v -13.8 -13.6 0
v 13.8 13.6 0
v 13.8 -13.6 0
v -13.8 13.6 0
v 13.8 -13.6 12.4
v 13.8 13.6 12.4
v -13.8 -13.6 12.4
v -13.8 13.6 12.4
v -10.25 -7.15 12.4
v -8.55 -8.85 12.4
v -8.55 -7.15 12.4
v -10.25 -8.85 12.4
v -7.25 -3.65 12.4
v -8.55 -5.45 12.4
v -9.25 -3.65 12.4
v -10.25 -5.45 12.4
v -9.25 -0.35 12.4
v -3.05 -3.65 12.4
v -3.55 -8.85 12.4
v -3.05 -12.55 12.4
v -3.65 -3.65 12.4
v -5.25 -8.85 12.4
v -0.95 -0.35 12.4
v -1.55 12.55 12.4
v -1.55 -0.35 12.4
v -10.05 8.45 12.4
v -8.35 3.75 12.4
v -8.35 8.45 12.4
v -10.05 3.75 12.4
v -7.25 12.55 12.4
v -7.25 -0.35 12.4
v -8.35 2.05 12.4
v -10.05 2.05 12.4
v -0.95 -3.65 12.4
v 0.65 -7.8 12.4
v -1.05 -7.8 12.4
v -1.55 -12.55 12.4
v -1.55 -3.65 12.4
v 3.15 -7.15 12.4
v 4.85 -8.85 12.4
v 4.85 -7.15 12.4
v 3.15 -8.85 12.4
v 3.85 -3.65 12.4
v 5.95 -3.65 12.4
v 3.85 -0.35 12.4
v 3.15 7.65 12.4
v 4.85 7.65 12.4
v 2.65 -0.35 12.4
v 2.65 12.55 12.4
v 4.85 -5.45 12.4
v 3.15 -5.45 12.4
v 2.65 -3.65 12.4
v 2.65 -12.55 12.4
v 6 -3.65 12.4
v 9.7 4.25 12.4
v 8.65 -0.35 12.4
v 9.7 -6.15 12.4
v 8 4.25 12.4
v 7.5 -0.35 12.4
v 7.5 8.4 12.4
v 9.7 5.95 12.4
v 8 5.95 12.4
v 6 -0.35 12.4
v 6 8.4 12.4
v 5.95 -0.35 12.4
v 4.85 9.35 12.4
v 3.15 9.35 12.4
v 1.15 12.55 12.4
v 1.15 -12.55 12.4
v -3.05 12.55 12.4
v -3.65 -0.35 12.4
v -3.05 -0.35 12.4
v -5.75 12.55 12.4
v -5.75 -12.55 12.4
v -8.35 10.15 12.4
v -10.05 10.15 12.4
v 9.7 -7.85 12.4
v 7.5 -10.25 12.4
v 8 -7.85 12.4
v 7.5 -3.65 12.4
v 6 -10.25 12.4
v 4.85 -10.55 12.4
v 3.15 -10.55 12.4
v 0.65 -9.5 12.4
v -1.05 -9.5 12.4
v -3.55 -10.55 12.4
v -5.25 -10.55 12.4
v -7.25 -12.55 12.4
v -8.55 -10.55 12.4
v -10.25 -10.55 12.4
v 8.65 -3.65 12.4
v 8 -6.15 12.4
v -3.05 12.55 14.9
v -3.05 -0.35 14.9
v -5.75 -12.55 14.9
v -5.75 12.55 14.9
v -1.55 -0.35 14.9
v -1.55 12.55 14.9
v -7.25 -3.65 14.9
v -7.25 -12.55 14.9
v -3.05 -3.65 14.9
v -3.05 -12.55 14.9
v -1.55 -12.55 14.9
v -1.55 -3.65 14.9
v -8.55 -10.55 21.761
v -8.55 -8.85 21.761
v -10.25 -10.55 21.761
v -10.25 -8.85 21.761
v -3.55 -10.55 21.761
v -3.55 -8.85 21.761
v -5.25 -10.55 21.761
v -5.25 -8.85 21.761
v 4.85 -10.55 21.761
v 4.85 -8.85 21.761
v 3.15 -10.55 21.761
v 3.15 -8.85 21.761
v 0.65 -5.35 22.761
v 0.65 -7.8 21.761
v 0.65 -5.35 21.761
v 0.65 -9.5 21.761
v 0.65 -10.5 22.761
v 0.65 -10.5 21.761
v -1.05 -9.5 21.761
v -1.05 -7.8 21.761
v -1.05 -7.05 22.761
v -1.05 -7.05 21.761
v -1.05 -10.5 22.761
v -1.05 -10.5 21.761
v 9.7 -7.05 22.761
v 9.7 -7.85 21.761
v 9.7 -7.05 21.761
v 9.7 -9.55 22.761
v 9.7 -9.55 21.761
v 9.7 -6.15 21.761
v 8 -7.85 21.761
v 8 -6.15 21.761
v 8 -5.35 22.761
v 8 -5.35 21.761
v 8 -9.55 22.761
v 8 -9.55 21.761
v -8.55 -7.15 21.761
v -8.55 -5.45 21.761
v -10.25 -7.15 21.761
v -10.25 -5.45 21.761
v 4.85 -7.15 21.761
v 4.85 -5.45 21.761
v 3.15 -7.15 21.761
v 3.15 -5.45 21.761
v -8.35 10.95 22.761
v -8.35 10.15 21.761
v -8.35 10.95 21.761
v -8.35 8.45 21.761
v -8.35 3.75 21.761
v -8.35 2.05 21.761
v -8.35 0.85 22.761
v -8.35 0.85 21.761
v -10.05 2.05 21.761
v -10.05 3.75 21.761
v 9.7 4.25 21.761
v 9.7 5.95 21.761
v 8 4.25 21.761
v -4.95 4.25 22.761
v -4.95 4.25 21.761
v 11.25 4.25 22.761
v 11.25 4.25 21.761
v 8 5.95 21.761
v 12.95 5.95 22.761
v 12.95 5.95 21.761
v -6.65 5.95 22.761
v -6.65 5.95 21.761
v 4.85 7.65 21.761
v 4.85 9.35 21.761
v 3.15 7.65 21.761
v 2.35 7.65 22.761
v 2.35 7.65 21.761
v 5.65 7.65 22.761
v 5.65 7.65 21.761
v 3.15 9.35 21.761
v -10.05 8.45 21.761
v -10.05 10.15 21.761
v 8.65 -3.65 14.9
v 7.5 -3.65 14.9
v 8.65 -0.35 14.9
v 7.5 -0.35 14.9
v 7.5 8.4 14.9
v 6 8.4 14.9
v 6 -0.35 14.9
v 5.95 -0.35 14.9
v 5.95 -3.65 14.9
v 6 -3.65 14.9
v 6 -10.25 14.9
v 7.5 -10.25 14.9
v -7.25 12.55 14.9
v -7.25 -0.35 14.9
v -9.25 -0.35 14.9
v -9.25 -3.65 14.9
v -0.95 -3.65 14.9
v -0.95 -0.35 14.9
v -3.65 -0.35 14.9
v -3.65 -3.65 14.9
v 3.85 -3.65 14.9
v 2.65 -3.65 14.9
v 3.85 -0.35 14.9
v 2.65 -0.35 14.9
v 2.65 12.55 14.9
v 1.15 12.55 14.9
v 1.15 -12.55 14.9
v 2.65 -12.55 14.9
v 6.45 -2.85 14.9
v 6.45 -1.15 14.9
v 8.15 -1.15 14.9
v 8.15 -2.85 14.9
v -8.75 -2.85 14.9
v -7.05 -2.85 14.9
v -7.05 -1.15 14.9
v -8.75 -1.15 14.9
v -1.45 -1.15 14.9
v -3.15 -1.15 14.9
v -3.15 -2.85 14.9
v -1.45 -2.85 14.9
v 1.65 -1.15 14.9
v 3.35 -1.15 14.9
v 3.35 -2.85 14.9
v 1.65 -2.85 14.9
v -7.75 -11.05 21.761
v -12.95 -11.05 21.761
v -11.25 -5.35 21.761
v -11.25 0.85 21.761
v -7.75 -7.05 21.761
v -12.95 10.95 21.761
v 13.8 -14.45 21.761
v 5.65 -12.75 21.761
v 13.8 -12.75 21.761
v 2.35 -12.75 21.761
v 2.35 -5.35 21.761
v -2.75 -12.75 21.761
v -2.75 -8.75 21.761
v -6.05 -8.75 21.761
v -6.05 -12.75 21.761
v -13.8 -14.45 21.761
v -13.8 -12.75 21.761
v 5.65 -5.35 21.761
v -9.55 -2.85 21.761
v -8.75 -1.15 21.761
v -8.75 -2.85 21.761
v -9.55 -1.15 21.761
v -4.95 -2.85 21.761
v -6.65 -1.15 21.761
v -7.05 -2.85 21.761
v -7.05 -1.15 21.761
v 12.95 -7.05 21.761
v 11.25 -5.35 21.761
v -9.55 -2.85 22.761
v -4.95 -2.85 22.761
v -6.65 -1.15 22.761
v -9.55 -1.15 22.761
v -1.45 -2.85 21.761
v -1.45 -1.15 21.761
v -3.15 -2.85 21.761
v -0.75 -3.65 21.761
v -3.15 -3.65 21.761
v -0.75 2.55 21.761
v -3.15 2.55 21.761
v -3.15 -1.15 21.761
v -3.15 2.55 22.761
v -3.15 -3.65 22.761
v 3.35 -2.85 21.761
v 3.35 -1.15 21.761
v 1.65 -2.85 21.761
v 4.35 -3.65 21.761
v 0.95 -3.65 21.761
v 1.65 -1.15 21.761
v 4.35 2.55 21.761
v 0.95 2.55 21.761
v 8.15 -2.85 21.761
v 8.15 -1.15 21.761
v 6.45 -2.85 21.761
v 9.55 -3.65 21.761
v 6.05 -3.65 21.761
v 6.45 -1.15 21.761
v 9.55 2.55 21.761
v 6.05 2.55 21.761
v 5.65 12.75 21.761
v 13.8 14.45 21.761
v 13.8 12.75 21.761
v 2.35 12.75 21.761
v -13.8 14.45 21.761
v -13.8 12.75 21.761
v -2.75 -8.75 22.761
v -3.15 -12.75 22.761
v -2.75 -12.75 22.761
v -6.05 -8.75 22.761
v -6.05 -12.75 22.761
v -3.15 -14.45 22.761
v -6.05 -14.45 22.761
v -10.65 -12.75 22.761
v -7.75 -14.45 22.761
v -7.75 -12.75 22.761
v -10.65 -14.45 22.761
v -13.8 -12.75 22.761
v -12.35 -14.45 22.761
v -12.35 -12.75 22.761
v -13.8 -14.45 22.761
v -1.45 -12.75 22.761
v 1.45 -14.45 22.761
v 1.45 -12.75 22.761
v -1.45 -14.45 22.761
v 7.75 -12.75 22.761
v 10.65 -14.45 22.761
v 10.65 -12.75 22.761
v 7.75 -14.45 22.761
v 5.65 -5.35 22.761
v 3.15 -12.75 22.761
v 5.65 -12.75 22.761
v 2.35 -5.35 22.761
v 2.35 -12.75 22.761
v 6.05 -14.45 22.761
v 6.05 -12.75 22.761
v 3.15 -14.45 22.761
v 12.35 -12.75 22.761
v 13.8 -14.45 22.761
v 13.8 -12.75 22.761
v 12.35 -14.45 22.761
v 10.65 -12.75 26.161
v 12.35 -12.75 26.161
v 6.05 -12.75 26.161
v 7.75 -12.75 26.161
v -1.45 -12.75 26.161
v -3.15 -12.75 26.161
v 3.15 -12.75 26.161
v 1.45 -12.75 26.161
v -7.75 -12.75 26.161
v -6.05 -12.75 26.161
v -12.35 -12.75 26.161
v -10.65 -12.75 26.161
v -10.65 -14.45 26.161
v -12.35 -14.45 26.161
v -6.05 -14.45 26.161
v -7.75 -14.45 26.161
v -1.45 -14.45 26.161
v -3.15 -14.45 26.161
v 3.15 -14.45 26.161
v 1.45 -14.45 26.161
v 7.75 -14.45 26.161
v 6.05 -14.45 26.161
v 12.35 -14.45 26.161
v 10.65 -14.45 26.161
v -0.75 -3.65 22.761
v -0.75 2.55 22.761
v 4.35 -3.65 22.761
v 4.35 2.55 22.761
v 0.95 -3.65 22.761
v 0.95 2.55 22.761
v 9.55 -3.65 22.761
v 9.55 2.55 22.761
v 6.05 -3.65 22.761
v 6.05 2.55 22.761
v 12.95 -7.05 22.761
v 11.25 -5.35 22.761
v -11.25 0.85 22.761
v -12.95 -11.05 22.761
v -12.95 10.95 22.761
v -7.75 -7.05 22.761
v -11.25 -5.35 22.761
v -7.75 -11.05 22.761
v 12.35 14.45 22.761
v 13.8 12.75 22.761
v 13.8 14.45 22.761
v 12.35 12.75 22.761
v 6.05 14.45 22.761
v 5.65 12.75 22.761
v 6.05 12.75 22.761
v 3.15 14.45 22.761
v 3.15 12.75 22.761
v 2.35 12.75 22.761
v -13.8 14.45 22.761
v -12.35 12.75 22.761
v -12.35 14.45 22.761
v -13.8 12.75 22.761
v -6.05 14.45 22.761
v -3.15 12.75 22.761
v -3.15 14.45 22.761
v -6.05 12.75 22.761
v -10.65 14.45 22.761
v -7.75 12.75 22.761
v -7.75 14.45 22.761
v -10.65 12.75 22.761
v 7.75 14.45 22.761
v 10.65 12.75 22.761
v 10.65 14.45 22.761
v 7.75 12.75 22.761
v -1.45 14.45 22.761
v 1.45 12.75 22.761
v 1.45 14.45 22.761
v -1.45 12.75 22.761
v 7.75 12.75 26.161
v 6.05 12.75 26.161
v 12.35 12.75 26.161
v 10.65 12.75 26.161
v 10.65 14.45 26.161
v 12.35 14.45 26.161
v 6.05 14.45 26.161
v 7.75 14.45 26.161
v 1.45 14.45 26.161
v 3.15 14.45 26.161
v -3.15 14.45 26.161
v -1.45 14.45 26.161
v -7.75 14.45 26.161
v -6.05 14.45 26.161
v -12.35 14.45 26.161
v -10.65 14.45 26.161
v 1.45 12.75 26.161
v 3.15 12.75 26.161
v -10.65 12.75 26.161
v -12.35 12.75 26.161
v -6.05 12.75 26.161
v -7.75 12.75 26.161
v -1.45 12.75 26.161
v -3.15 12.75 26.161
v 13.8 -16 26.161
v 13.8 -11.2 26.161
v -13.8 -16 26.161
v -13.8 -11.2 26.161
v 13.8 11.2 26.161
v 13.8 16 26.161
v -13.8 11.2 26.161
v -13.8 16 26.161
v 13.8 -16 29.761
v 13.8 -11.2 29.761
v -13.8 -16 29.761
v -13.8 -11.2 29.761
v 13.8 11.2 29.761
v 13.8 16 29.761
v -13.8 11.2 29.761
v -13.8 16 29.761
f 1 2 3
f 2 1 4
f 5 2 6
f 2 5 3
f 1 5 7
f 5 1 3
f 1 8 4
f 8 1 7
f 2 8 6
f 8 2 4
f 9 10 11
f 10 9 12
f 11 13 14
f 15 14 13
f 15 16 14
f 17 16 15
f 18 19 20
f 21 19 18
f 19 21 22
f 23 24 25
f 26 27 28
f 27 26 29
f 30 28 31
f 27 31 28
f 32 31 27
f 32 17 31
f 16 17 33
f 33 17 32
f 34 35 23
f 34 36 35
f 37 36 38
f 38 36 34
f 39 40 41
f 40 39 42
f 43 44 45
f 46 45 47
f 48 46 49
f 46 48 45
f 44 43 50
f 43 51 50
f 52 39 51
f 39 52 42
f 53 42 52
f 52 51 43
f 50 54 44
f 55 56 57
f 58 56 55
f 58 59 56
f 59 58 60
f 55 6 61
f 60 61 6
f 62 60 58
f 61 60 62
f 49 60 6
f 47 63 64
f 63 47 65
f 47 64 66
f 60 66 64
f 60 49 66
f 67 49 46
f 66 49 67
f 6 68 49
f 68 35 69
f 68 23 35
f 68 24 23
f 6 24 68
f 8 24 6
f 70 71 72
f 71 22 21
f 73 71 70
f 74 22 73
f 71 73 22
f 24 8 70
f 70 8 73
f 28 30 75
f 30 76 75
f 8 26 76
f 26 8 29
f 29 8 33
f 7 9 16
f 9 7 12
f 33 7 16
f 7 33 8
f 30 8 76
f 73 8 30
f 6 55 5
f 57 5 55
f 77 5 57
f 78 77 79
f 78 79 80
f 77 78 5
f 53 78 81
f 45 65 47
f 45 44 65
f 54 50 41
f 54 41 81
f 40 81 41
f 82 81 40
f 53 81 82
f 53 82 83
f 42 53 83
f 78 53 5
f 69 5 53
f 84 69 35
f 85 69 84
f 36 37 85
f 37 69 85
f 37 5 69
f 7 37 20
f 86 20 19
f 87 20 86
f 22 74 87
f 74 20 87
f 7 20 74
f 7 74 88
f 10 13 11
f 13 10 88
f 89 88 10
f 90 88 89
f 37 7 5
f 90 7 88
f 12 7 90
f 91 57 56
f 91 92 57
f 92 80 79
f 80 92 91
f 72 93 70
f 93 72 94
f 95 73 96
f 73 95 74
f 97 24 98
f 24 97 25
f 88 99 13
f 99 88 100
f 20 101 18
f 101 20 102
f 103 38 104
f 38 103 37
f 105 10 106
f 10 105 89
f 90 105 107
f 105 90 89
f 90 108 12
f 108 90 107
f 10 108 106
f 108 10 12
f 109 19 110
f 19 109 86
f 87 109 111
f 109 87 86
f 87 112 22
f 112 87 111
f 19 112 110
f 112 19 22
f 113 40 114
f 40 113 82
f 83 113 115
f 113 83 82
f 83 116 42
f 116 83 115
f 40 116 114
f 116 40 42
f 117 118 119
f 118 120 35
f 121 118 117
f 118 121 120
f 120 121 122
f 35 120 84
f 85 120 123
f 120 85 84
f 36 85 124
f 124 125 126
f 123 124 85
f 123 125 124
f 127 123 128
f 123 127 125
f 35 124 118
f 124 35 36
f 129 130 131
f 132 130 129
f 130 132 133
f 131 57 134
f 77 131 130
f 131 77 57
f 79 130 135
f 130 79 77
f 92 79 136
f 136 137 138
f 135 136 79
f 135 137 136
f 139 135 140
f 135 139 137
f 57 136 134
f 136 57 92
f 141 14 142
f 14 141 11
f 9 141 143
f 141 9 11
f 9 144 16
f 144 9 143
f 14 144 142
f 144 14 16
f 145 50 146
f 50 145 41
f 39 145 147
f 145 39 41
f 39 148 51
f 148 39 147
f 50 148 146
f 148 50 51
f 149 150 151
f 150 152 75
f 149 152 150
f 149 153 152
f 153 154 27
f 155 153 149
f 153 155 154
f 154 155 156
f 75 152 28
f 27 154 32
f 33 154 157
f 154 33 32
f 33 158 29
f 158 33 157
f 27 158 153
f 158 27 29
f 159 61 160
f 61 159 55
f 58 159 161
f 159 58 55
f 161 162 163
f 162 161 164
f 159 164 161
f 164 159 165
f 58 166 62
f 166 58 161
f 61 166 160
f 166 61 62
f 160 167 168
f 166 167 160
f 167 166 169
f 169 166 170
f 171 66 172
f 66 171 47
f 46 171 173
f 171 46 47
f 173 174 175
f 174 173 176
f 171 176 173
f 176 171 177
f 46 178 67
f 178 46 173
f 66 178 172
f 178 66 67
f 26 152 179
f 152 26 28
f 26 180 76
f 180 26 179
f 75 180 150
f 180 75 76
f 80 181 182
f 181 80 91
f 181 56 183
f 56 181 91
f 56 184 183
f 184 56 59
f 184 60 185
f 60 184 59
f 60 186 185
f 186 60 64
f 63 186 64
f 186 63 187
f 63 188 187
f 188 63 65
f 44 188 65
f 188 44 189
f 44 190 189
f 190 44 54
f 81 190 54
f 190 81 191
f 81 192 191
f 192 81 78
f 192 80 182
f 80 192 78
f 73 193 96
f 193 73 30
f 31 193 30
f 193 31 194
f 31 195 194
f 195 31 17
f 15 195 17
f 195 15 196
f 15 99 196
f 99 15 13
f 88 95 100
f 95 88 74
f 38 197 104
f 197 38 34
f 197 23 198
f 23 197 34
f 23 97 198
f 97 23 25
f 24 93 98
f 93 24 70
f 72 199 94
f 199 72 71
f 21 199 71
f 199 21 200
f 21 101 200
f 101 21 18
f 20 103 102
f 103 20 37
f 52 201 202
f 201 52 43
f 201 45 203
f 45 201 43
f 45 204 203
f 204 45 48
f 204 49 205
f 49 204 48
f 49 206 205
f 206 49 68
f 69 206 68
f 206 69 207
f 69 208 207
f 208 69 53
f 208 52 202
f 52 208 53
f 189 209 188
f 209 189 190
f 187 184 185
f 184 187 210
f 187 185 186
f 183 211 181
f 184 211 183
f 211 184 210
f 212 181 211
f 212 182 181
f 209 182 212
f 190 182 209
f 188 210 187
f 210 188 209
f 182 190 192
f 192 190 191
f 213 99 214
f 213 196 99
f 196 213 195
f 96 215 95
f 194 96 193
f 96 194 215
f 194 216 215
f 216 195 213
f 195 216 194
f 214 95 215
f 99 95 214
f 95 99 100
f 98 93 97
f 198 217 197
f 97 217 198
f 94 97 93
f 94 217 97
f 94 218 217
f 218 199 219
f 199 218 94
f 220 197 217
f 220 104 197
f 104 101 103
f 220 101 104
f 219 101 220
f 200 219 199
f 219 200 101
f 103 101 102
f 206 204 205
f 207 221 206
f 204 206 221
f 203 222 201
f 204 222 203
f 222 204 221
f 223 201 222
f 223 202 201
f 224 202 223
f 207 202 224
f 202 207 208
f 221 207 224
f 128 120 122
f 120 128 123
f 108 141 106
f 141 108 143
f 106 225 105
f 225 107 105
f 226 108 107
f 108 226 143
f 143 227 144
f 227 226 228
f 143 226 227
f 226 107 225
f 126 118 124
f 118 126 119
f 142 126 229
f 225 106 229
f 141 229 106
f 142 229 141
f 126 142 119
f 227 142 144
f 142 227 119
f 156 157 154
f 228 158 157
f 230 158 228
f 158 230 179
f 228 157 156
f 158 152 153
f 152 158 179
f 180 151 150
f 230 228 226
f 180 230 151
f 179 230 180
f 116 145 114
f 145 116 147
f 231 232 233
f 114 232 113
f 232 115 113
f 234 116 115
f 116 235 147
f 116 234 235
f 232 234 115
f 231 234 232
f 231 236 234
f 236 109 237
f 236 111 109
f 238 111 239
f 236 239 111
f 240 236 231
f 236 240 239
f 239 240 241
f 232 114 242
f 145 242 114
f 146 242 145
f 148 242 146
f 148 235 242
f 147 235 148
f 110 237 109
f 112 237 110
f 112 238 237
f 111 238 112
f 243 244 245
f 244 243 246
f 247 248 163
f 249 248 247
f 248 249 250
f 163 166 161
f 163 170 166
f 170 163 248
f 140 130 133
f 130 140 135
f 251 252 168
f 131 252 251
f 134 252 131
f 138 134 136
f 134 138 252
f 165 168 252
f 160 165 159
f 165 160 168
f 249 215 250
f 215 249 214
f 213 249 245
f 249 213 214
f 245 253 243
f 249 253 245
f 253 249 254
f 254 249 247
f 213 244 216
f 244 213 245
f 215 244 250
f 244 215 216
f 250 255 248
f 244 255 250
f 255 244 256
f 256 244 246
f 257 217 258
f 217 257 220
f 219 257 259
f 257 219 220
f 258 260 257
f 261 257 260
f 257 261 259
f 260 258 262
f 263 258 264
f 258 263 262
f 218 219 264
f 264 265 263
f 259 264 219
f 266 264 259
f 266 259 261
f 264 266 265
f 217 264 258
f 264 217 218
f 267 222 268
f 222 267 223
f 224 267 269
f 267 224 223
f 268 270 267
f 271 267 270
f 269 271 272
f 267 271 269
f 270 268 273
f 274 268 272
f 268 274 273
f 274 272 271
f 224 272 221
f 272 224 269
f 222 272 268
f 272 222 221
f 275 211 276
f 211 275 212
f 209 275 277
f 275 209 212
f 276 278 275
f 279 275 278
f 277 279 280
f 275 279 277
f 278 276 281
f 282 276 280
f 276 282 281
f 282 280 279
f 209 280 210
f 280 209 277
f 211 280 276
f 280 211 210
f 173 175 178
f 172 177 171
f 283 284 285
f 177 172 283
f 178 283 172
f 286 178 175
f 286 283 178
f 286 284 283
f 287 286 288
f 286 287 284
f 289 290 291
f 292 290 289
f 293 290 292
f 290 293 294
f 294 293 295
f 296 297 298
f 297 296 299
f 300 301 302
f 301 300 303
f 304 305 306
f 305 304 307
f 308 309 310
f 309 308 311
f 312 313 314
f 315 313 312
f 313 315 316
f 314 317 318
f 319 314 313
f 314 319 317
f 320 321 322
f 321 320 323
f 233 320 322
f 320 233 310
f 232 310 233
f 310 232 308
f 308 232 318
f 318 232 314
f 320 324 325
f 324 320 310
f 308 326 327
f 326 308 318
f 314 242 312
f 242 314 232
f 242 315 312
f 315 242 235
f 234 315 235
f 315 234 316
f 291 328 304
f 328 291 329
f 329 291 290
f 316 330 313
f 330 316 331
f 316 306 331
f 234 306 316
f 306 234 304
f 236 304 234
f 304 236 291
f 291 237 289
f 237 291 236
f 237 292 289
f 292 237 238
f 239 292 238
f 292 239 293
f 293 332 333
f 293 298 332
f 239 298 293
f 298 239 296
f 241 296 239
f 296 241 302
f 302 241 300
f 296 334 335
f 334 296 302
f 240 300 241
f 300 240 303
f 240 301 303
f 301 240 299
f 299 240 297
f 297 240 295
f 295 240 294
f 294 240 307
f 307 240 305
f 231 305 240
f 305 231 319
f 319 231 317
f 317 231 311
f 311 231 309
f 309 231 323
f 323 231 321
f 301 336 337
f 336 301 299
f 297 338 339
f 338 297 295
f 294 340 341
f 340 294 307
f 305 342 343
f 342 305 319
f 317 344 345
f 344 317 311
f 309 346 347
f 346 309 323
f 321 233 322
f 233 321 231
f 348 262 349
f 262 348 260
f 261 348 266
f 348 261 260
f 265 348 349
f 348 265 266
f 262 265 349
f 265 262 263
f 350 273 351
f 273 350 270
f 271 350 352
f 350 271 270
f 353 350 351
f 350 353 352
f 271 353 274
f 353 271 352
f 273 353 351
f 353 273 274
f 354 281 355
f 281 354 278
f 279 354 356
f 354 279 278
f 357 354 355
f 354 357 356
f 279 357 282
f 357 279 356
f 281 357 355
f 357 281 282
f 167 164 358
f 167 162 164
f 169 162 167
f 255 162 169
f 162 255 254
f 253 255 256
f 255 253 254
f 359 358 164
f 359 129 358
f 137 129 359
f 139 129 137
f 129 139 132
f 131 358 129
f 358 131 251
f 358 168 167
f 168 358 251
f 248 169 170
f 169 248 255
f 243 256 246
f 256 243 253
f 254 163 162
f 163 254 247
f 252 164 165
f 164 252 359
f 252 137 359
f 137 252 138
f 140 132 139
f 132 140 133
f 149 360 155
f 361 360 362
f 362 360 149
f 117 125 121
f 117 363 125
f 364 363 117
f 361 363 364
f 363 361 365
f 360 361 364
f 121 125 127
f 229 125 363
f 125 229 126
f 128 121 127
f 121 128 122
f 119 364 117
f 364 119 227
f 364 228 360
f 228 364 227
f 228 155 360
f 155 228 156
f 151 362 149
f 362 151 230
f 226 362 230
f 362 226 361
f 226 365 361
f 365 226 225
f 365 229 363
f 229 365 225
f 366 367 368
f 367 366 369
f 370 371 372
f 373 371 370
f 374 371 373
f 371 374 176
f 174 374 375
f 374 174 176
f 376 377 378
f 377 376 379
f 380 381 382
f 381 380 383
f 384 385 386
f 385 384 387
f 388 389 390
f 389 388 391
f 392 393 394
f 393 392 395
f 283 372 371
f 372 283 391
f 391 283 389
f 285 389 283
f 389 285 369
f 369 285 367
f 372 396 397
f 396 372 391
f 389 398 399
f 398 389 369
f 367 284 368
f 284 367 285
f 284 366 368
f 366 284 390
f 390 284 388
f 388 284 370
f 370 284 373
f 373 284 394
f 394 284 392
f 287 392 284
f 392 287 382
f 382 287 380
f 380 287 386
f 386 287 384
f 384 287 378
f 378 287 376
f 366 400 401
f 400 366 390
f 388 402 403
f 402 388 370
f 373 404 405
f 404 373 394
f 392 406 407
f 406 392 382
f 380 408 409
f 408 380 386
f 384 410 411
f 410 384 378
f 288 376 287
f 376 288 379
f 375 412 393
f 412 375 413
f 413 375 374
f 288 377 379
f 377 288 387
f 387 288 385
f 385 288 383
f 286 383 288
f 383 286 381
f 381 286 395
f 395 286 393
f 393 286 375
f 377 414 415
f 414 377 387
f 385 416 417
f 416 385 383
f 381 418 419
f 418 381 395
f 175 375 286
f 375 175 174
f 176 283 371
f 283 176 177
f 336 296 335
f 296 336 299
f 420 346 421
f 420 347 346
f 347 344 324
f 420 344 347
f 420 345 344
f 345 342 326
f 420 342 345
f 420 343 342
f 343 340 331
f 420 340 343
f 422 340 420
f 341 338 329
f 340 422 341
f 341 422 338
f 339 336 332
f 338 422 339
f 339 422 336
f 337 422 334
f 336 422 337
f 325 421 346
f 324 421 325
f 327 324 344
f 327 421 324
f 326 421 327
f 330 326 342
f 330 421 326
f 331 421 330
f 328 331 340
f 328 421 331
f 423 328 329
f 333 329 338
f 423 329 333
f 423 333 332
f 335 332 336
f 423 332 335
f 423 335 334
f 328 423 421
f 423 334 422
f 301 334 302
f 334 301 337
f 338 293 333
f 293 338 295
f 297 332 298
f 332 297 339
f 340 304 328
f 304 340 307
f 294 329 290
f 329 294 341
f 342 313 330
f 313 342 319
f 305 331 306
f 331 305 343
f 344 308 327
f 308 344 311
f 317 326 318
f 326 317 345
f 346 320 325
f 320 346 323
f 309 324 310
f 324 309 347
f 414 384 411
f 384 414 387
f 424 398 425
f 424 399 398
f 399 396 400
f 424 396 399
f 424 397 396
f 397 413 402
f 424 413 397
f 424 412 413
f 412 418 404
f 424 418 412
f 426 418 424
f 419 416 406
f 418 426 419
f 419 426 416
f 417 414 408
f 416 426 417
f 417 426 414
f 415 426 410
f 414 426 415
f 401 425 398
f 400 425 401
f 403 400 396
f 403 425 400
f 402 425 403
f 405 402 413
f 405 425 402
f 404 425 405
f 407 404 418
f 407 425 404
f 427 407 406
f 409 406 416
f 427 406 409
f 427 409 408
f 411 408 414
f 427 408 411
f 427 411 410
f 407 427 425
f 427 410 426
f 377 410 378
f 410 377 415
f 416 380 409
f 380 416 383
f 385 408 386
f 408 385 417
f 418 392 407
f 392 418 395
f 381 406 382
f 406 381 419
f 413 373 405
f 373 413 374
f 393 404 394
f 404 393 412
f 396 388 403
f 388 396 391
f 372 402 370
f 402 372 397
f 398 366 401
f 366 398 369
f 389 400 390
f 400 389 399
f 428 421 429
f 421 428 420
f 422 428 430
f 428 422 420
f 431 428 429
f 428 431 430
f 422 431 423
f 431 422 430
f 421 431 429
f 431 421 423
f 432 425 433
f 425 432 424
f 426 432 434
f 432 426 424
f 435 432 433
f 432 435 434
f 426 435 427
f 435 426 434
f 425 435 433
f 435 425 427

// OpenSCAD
// Generated by SolidPython 0.4.2 on 2020-09-29 23:21:32
//!OpenSCAD

scale(v = 0.0100000000) {
	translate(v = [-1380, -1360, 0]) {
		union() {
			color(c = [0.4000000000, 0.4000000000, 0.4000000000]) {
				translate(v = [0, 0, 0]) {
					linear_extrude(height = 1000.0000000000) {
						polygon(paths = [[0, 1, 2, 3]], points = [[0, 0], [0, 2720], [2760, 2720], [2760, 0]]);
					}
				}
			}
			color(c = [0.2000000000, 0.6000000000, 0.2000000000]) {
				translate(v = [0, 0, 1000.0000000000]) {
					linear_extrude(height = 120.0000000000) {
						polygon(paths = [[0, 1, 2, 3]], points = [[0, 1305], [0, 2720], [2760, 2720], [2760, 1305]]);
					}
				}
			}
			color(c = [0.4000000000, 0.4000000000, 0.4000000000]) {
				translate(v = [0, 0, 1000.0000000000]) {
					linear_extrude(height = 120.0000000000) {
						polygon(paths = [[0, 1, 2, 3]], points = [[0, 0], [0, 1305], [2760, 1305], [2760, 0]]);
					}
				}
			}
			color(c = [0.9000000000, 0.6000000000, 0.6000000000]) {
				translate(v = [0, 0, 1120.0000000000]) {
					linear_extrude(height = 120.0000000000) {
						polygon(paths = [[0, 1, 2, 3]], points = [[2130, 1650], [2130, 2070], [2390, 2070], [2390, 1650]]);
					}
				}
			}
			color(c = [0.9000000000, 0.6000000000, 0.6000000000]) {
				translate(v = [0, 0, 1120.0000000000]) {
					linear_extrude(height = 120.0000000000) {
						polygon(paths = [[0, 1, 2, 3]], points = [[335, 1485], [335, 2485], [655, 2485], [655, 1485]]);
					}
				}
			}
			color(c = [0.9000000000, 0.6000000000, 0.6000000000]) {
				translate(v = [0, 0, 1120.0000000000]) {
					linear_extrude(height = 120.0000000000) {
						polygon(paths = [[0, 1, 2, 3]], points = [[805, 1485], [805, 2485], [1075, 2485], [1075, 1485]]);
					}
				}
			}
			color(c = [0.9000000000, 0.6000000000, 0.6000000000]) {
				translate(v = [0, 0, 1120.0000000000]) {
					linear_extrude(height = 120.0000000000) {
						polygon(paths = [[0, 1, 2, 3]], points = [[1225, 1485], [1225, 2485], [1495, 2485], [1495, 1485]]);
					}
				}
			}
			color(c = [0.9000000000, 0.6000000000, 0.6000000000]) {
				translate(v = [0, 0, 1120.0000000000]) {
					linear_extrude(height = 120.0000000000) {
						polygon(paths = [[0, 1, 2, 3, 4, 5, 6, 7]], points = [[1645, 1485], [1645, 2485], [1905, 2485], [1905, 2070], [1980, 2070], [1980, 1650], [1905, 1650], [1905, 1485]]);
					}
				}
			}
			color(c = [0.9000000000, 0.6000000000, 0.9000000000]) {
				translate(v = [0, 0, 1120.0000000000]) {
					linear_extrude(height = 120.0000000000) {
						polygon(paths = [[0, 1, 2, 3]], points = [[315, 235], [315, 885], [655, 885], [655, 235]]);
					}
				}
			}
			color(c = [0.9000000000, 0.6000000000, 0.9000000000]) {
				translate(v = [0, 0, 1120.0000000000]) {
					linear_extrude(height = 120.0000000000) {
						polygon(paths = [[0, 1, 2, 3]], points = [[805, 235], [805, 885], [1075, 885], [1075, 235]]);
					}
				}
			}
			color(c = [0.9000000000, 0.6000000000, 0.9000000000]) {
				translate(v = [0, 0, 1120.0000000000]) {
					linear_extrude(height = 120.0000000000) {
						polygon(paths = [[0, 1, 2, 3]], points = [[1225, 235], [1225, 885], [1495, 885], [1495, 235]]);
					}
				}
			}
			color(c = [0.9000000000, 0.6000000000, 0.9000000000]) {
				translate(v = [0, 0, 1120.0000000000]) {
					linear_extrude(height = 120.0000000000) {
						polygon(paths = [[0, 1, 2, 3, 4, 5]], points = [[1645, 235], [1645, 885], [1980, 885], [1980, 465], [1905, 465], [1905, 235]]);
					}
				}
			}
			color(c = [0.9000000000, 0.6000000000, 0.9000000000]) {
				translate(v = [0, 0, 1120.0000000000]) {
					linear_extrude(height = 120.0000000000) {
						polygon(paths = [[0, 1, 2, 3]], points = [[2130, 465], [2130, 885], [2390, 885], [2390, 465]]);
					}
				}
			}
			color(c = [0.2000000000, 0.6000000000, 0.2000000000]) {
				translate(v = [0, 0, 1120.0000000000]) {
					linear_extrude(height = 120.0000000000) {
						difference() {
							polygon(paths = [[0, 1, 2, 3]], points = [[0, 1305], [0, 2720], [2760, 2720], [2760, 1305]]);
							polygon(paths = [[0, 1, 2, 3]], points = [[335, 1485], [655, 1485], [655, 2485], [335, 2485]]);
							polygon(paths = [[0, 1, 2, 3]], points = [[805, 1485], [1075, 1485], [1075, 2485], [805, 2485]]);
							polygon(paths = [[0, 1, 2, 3]], points = [[1225, 1485], [1495, 1485], [1495, 2485], [1225, 2485]]);
							polygon(paths = [[0, 1, 2, 3]], points = [[2130, 1650], [2390, 1650], [2390, 2070], [2130, 2070]]);
							polygon(paths = [[0, 1, 2, 3, 4, 5, 6, 7]], points = [[1645, 1485], [1905, 1485], [1905, 1650], [1980, 1650], [1980, 2070], [1905, 2070], [1905, 2485], [1645, 2485]]);
						}
					}
				}
			}
			color(c = [0.4000000000, 0.4000000000, 0.4000000000]) {
				translate(v = [0, 0, 1120.0000000000]) {
					linear_extrude(height = 120.0000000000) {
						difference() {
							polygon(paths = [[0, 1, 2, 3]], points = [[0, 0], [0, 1305], [2760, 1305], [2760, 0]]);
							polygon(paths = [[0, 1, 2, 3]], points = [[315, 235], [655, 235], [655, 885], [315, 885]]);
							polygon(paths = [[0, 1, 2, 3]], points = [[805, 235], [1075, 235], [1075, 885], [805, 885]]);
							polygon(paths = [[0, 1, 2, 3]], points = [[1225, 235], [1495, 235], [1495, 885], [1225, 885]]);
							polygon(paths = [[0, 1, 2, 3]], points = [[2130, 465], [2390, 465], [2390, 885], [2130, 885]]);
							polygon(paths = [[0, 1, 2, 3, 4, 5]], points = [[1645, 235], [1905, 235], [1905, 465], [1980, 465], [1980, 885], [1645, 885]]);
						}
					}
				}
			}
			color(c = [0.1000000000, 0.1000000000, 0.1000000000]) {
				translate(v = [0, 0, 1240.0000000000]) {
					linear_extrude(height = 70.0000000000) {
						polygon(paths = [[0, 1, 2, 3]], points = [[355, 305], [355, 475], [525, 475], [525, 305]]);
					}
				}
			}
			color(c = [0.1000000000, 0.1000000000, 0.1000000000]) {
				translate(v = [0, 0, 1240.0000000000]) {
					linear_extrude(height = 70.0000000000) {
						polygon(paths = [[0, 1, 2, 3]], points = [[855, 305], [855, 475], [1025, 475], [1025, 305]]);
					}
				}
			}
			color(c = [0.1000000000, 0.1000000000, 0.1000000000]) {
				translate(v = [0, 0, 1240.0000000000]) {
					linear_extrude(height = 70.0000000000) {
						polygon(paths = [[0, 1, 2, 3]], points = [[1695, 305], [1695, 475], [1865, 475], [1865, 305]]);
					}
				}
			}
			color(c = [0.1000000000, 0.1000000000, 0.1000000000]) {
				translate(v = [0, 0, 1240.0000000000]) {
					linear_extrude(height = 70.0000000000) {
						polygon(paths = [[0, 1, 2, 3]], points = [[1275, 410], [1275, 580], [1445, 580], [1445, 410]]);
					}
				}
			}
			color(c = [0.1000000000, 0.1000000000, 0.1000000000]) {
				translate(v = [0, 0, 1240.0000000000]) {
					linear_extrude(height = 70.0000000000) {
						polygon(paths = [[0, 1, 2, 3]], points = [[2180, 575], [2180, 745], [2350, 745], [2350, 575]]);
					}
				}
			}
			color(c = [0.1000000000, 0.1000000000, 0.1000000000]) {
				translate(v = [0, 0, 1240.0000000000]) {
					linear_extrude(height = 70.0000000000) {
						polygon(paths = [[0, 1, 2, 3]], points = [[355, 645], [355, 815], [525, 815], [525, 645]]);
					}
				}
			}
			color(c = [0.1000000000, 0.1000000000, 0.1000000000]) {
				translate(v = [0, 0, 1240.0000000000]) {
					linear_extrude(height = 70.0000000000) {
						polygon(paths = [[0, 1, 2, 3]], points = [[1695, 645], [1695, 815], [1865, 815], [1865, 645]]);
					}
				}
			}
			color(c = [0.1000000000, 0.1000000000, 0.1000000000]) {
				translate(v = [0, 0, 1240.0000000000]) {
					linear_extrude(height = 70.0000000000) {
						polygon(paths = [[0, 1, 2, 3]], points = [[375, 1565], [375, 1735], [545, 1735], [545, 1565]]);
					}
				}
			}
			color(c = [0.1000000000, 0.1000000000, 0.1000000000]) {
				translate(v = [0, 0, 1240.0000000000]) {
					linear_extrude(height = 70.0000000000) {
						polygon(paths = [[0, 1, 2, 3]], points = [[2180, 1785], [2180, 1955], [2350, 1955], [2350, 1785]]);
					}
				}
			}
			color(c = [0.1000000000, 0.1000000000, 0.1000000000]) {
				translate(v = [0, 0, 1240.0000000000]) {
					linear_extrude(height = 70.0000000000) {
						polygon(paths = [[0, 1, 2, 3]], points = [[1695, 2125], [1695, 2295], [1865, 2295], [1865, 2125]]);
					}
				}
			}
			color(c = [0.1000000000, 0.1000000000, 0.1000000000]) {
				translate(v = [0, 0, 1240.0000000000]) {
					linear_extrude(height = 70.0000000000) {
						polygon(paths = [[0, 1, 2, 3]], points = [[375, 2205], [375, 2375], [545, 2375], [545, 2205]]);
					}
				}
			}
			color(c = [1.0000000000, 1.0000000000, 1.0000000000]) {
				translate(v = [0, 0, 1240.0000000000]) {
					linear_extrude(height = 70.0000000000) {
						polygon(paths = [[0, 1, 2, 3, 4, 5, 6, 7, 8, 9, 10, 11]], points = [[1980, 335], [1980, 995], [1975, 995], [1975, 1325], [1980, 1325], [1980, 2200], [2130, 2200], [2130, 1325], [2245, 1325], [2245, 995], [2130, 995], [2130, 335]]);
					}
				}
			}
			color(c = [1.0000000000, 1.0000000000, 1.0000000000]) {
				translate(v = [0, 0, 1240.0000000000]) {
					linear_extrude(height = 70.0000000000) {
						polygon(paths = [[0, 1, 2, 3, 4, 5, 6, 7]], points = [[655, 105], [655, 995], [455, 995], [455, 1325], [655, 1325], [655, 2615], [805, 2615], [805, 105]]);
					}
				}
			}
			color(c = [1.0000000000, 1.0000000000, 1.0000000000]) {
				translate(v = [0, 0, 1240.0000000000]) {
					linear_extrude(height = 70.0000000000) {
						polygon(paths = [[0, 1, 2, 3, 4, 5, 6, 7, 8, 9, 10, 11]], points = [[1075, 105], [1075, 995], [1015, 995], [1015, 1325], [1075, 1325], [1075, 2615], [1225, 2615], [1225, 1325], [1285, 1325], [1285, 995], [1225, 995], [1225, 105]]);
					}
				}
			}
			color(c = [1.0000000000, 1.0000000000, 1.0000000000]) {
				translate(v = [0, 0, 1240.0000000000]) {
					linear_extrude(height = 70.0000000000) {
						polygon(paths = [[0, 1, 2, 3, 4, 5, 6, 7]], points = [[1495, 105], [1495, 2615], [1645, 2615], [1645, 1325], [1765, 1325], [1765, 995], [1645, 995], [1645, 105]]);
					}
				}
			}
			color(c = [0.1000000000, 0.1000000000, 0.1000000000]) {
				translate(v = [0, 0, 1310.0000000000]) {
					linear_extrude(height = 180.0000000000) {
						polygon(paths = [[0, 1, 2, 3]], points = [[355, 305], [355, 475], [525, 475], [525, 305]]);
					}
				}
			}
			color(c = [0.1000000000, 0.1000000000, 0.1000000000]) {
				translate(v = [0, 0, 1310.0000000000]) {
					linear_extrude(height = 180.0000000000) {
						polygon(paths = [[0, 1, 2, 3]], points = [[855, 305], [855, 475], [1025, 475], [1025, 305]]);
					}
				}
			}
			color(c = [0.1000000000, 0.1000000000, 0.1000000000]) {
				translate(v = [0, 0, 1310.0000000000]) {
					linear_extrude(height = 180.0000000000) {
						polygon(paths = [[0, 1, 2, 3]], points = [[1695, 305], [1695, 475], [1865, 475], [1865, 305]]);
					}
				}
			}
			color(c = [0.1000000000, 0.1000000000, 0.1000000000]) {
				translate(v = [0, 0, 1310.0000000000]) {
					linear_extrude(height = 180.0000000000) {
						polygon(paths = [[0, 1, 2, 3]], points = [[1275, 410], [1275, 580], [1445, 580], [1445, 410]]);
					}
				}
			}
			color(c = [0.1000000000, 0.1000000000, 0.1000000000]) {
				translate(v = [0, 0, 1310.0000000000]) {
					linear_extrude(height = 180.0000000000) {
						polygon(paths = [[0, 1, 2, 3]], points = [[2180, 575], [2180, 745], [2350, 745], [2350, 575]]);
					}
				}
			}
			color(c = [0.1000000000, 0.1000000000, 0.1000000000]) {
				translate(v = [0, 0, 1310.0000000000]) {
					linear_extrude(height = 180.0000000000) {
						polygon(paths = [[0, 1, 2, 3]], points = [[355, 645], [355, 815], [525, 815], [525, 645]]);
					}
				}
			}
			color(c = [0.1000000000, 0.1000000000, 0.1000000000]) {
				translate(v = [0, 0, 1310.0000000000]) {
					linear_extrude(height = 180.0000000000) {
						polygon(paths = [[0, 1, 2, 3]], points = [[1695, 645], [1695, 815], [1865, 815], [1865, 645]]);
					}
				}
			}
			color(c = [0.1000000000, 0.1000000000, 0.1000000000]) {
				translate(v = [0, 0, 1310.0000000000]) {
					linear_extrude(height = 180.0000000000) {
						polygon(paths = [[0, 1, 2, 3]], points = [[375, 1565], [375, 1735], [545, 1735], [545, 1565]]);
					}
				}
			}
			color(c = [0.1000000000, 0.1000000000, 0.1000000000]) {
				translate(v = [0, 0, 1310.0000000000]) {
					linear_extrude(height = 180.0000000000) {
						polygon(paths = [[0, 1, 2, 3]], points = [[2180, 1785], [2180, 1955], [2350, 1955], [2350, 1785]]);
					}
				}
			}
			color(c = [0.1000000000, 0.1000000000, 0.1000000000]) {
				translate(v = [0, 0, 1310.0000000000]) {
					linear_extrude(height = 180.0000000000) {
						polygon(paths = [[0, 1, 2, 3]], points = [[1695, 2125], [1695, 2295], [1865, 2295], [1865, 2125]]);
					}
				}
			}
			color(c = [0.1000000000, 0.1000000000, 0.1000000000]) {
				translate(v = [0, 0, 1310.0000000000]) {
					linear_extrude(height = 180.0000000000) {
						polygon(paths = [[0, 1, 2, 3]], points = [[375, 2205], [375, 2375], [545, 2375], [545, 2205]]);
					}
				}
			}
			color(c = [0.7000000000, 0, 0]) {
				translate(v = [0, 0, 1310.0000000000]) {
					linear_extrude(height = 180.0000000000) {
						polygon(paths = [[0, 1, 2, 3, 4, 5, 6, 7, 8, 9, 10, 11]], points = [[1980, 335], [1980, 995], [1975, 995], [1975, 1325], [1980, 1325], [1980, 2200], [2130, 2200], [2130, 1325], [2245, 1325], [2245, 995], [2130, 995], [2130, 335]]);
					}
				}
			}
			color(c = [0.7000000000, 0, 0]) {
				translate(v = [0, 0, 1310.0000000000]) {
					linear_extrude(height = 180.0000000000) {
						polygon(paths = [[0, 1, 2, 3, 4, 5, 6, 7]], points = [[655, 105], [655, 995], [455, 995], [455, 1325], [655, 1325], [655, 2615], [805, 2615], [805, 105]]);
					}
				}
			}
			color(c = [0.7000000000, 0, 0]) {
				translate(v = [0, 0, 1310.0000000000]) {
					linear_extrude(height = 180.0000000000) {
						polygon(paths = [[0, 1, 2, 3, 4, 5, 6, 7, 8, 9, 10, 11]], points = [[1075, 105], [1075, 995], [1015, 995], [1015, 1325], [1075, 1325], [1075, 2615], [1225, 2615], [1225, 1325], [1285, 1325], [1285, 995], [1225, 995], [1225, 105]]);
					}
				}
			}
			color(c = [0.7000000000, 0, 0]) {
				translate(v = [0, 0, 1310.0000000000]) {
					linear_extrude(height = 180.0000000000) {
						polygon(paths = [[0, 1, 2, 3, 4, 5, 6, 7]], points = [[1495, 105], [1495, 2615], [1645, 2615], [1645, 1325], [1765, 1325], [1765, 995], [1645, 995], [1645, 105]]);
					}
				}
			}
			color(c = [0.1000000000, 0.1000000000, 0.1000000000]) {
				translate(v = [0, 0, 1490.0000000000]) {
					linear_extrude(height = 686.1000000000) {
						polygon(paths = [[0, 1, 2, 3]], points = [[355, 305], [355, 475], [525, 475], [525, 305]]);
					}
				}
			}
			color(c = [0.1000000000, 0.1000000000, 0.1000000000]) {
				translate(v = [0, 0, 1490.0000000000]) {
					linear_extrude(height = 686.1000000000) {
						polygon(paths = [[0, 1, 2, 3]], points = [[855, 305], [855, 475], [1025, 475], [1025, 305]]);
					}
				}
			}
			color(c = [0.1000000000, 0.1000000000, 0.1000000000]) {
				translate(v = [0, 0, 1490.0000000000]) {
					linear_extrude(height = 686.1000000000) {
						polygon(paths = [[0, 1, 2, 3]], points = [[1695, 305], [1695, 475], [1865, 475], [1865, 305]]);
					}
				}
			}
			color(c = [0.1000000000, 0.1000000000, 0.1000000000]) {
				translate(v = [0, 0, 1490.0000000000]) {
					linear_extrude(height = 686.1000000000) {
						polygon(paths = [[0, 1, 2, 3]], points = [[1275, 410], [1275, 580], [1445, 580], [1445, 410]]);
					}
				}
			}
			color(c = [0.1000000000, 0.1000000000, 0.1000000000]) {
				translate(v = [0, 0, 1490.0000000000]) {
					linear_extrude(height = 686.1000000000) {
						polygon(paths = [[0, 1, 2, 3]], points = [[2180, 575], [2180, 745], [2350, 745], [2350, 575]]);
					}
				}
			}
			color(c = [0.1000000000, 0.1000000000, 0.1000000000]) {
				translate(v = [0, 0, 1490.0000000000]) {
					linear_extrude(height = 686.1000000000) {
						polygon(paths = [[0, 1, 2, 3]], points = [[355, 645], [355, 815], [525, 815], [525, 645]]);
					}
				}
			}
			color(c = [0.1000000000, 0.1000000000, 0.1000000000]) {
				translate(v = [0, 0, 1490.0000000000]) {
					linear_extrude(height = 686.1000000000) {
						polygon(paths = [[0, 1, 2, 3]], points = [[1695, 645], [1695, 815], [1865, 815], [1865, 645]]);
					}
				}
			}
			color(c = [0.1000000000, 0.1000000000, 0.1000000000]) {
				translate(v = [0, 0, 1490.0000000000]) {
					linear_extrude(height = 686.1000000000) {
						polygon(paths = [[0, 1, 2, 3]], points = [[505, 1075], [505, 1245], [675, 1245], [675, 1075]]);
					}
				}
			}
			color(c = [0.1000000000, 0.1000000000, 0.1000000000]) {
				translate(v = [0, 0, 1490.0000000000]) {
					linear_extrude(height = 686.1000000000) {
						polygon(paths = [[0, 1, 2, 3]], points = [[1065, 1075], [1065, 1245], [1235, 1245], [1235, 1075]]);
					}
				}
			}
			color(c = [0.1000000000, 0.1000000000, 0.1000000000]) {
				translate(v = [0, 0, 1490.0000000000]) {
					linear_extrude(height = 686.1000000000) {
						polygon(paths = [[0, 1, 2, 3]], points = [[1545, 1075], [1545, 1245], [1715, 1245], [1715, 1075]]);
					}
				}
			}
			color(c = [0.1000000000, 0.1000000000, 0.1000000000]) {
				translate(v = [0, 0, 1490.0000000000]) {
					linear_extrude(height = 686.1000000000) {
						polygon(paths = [[0, 1, 2, 3]], points = [[2025, 1075], [2025, 1245], [2195, 1245], [2195, 1075]]);
					}
				}
			}
			color(c = [0.1000000000, 0.1000000000, 0.1000000000]) {
				translate(v = [0, 0, 1490.0000000000]) {
					linear_extrude(height = 686.1000000000) {
						polygon(paths = [[0, 1, 2, 3]], points = [[375, 1565], [375, 1735], [545, 1735], [545, 1565]]);
					}
				}
			}
			color(c = [0.1000000000, 0.1000000000, 0.1000000000]) {
				translate(v = [0, 0, 1490.0000000000]) {
					linear_extrude(height = 686.1000000000) {
						polygon(paths = [[0, 1, 2, 3]], points = [[2180, 1785], [2180, 1955], [2350, 1955], [2350, 1785]]);
					}
				}
			}
			color(c = [0.1000000000, 0.1000000000, 0.1000000000]) {
				translate(v = [0, 0, 1490.0000000000]) {
					linear_extrude(height = 686.1000000000) {
						polygon(paths = [[0, 1, 2, 3]], points = [[1695, 2125], [1695, 2295], [1865, 2295], [1865, 2125]]);
					}
				}
			}
			color(c = [0.1000000000, 0.1000000000, 0.1000000000]) {
				translate(v = [0, 0, 1490.0000000000]) {
					linear_extrude(height = 686.1000000000) {
						polygon(paths = [[0, 1, 2, 3]], points = [[375, 2205], [375, 2375], [545, 2375], [545, 2205]]);
					}
				}
			}
			color(c = [0.9000000000, 0.6000000000, 0.6000000000]) {
				translate(v = [0, 0, 2176.1000000000]) {
					linear_extrude(height = 100.0000000000) {
						polygon(paths = [[0, 1, 2, 3, 4, 5, 6, 7, 8, 9, 10, 11]], points = [[0, -85], [0, 85], [775, 85], [775, 485], [1105, 485], [1105, 85], [1615, 85], [1615, 825], [1945, 825], [1945, 85], [2760, 85], [2760, -85]]);
					}
				}
			}
			color(c = [0.9000000000, 0.6000000000, 0.6000000000]) {
				translate(v = [0, 0, 2176.1000000000]) {
					linear_extrude(height = 100.0000000000) {
						polygon(paths = [[0, 1, 2, 3]], points = [[1065, 995], [1065, 1615], [1305, 1615], [1305, 995]]);
					}
				}
			}
			color(c = [0.9000000000, 0.6000000000, 0.6000000000]) {
				translate(v = [0, 0, 2176.1000000000]) {
					linear_extrude(height = 100.0000000000) {
						polygon(paths = [[0, 1, 2, 3]], points = [[1475, 995], [1475, 1615], [1815, 1615], [1815, 995]]);
					}
				}
			}
			color(c = [0.9000000000, 0.6000000000, 0.6000000000]) {
				translate(v = [0, 0, 2176.1000000000]) {
					linear_extrude(height = 100.0000000000) {
						polygon(paths = [[0, 1, 2, 3]], points = [[1985, 995], [1985, 1615], [2335, 1615], [2335, 995]]);
					}
				}
			}
			color(c = [0.9000000000, 0.6000000000, 0.6000000000]) {
				translate(v = [0, 0, 2176.1000000000]) {
					linear_extrude(height = 100.0000000000) {
						polygon(paths = [[0, 1, 2, 3, 4, 5, 6, 7, 8, 9, 10, 11, 12, 13]], points = [[2180, 405], [2180, 825], [2505, 825], [2505, 1785], [885, 1785], [885, 1075], [425, 1075], [425, 1245], [715, 1245], [715, 1955], [2675, 1955], [2675, 655], [2350, 655], [2350, 405]]);
					}
				}
			}
			color(c = [0.9000000000, 0.6000000000, 0.6000000000]) {
				translate(v = [0, 0, 2176.1000000000]) {
					linear_extrude(height = 100.0000000000) {
						polygon(paths = [[0, 1, 2, 3, 4, 5, 6, 7, 8, 9, 10, 11]], points = [[85, 255], [85, 2455], [545, 2455], [545, 1445], [255, 1445], [255, 825], [1445, 825], [1445, 310], [1275, 310], [1275, 655], [605, 655], [605, 255]]);
					}
				}
			}
			color(c = [0.9000000000, 0.6000000000, 0.6000000000]) {
				translate(v = [0, 0, 2176.1000000000]) {
					linear_extrude(height = 100.0000000000) {
						polygon(paths = [[0, 1, 2, 3, 4, 5, 6, 7]], points = [[1615, 2125], [1615, 2635], [0, 2635], [0, 2805], [2760, 2805], [2760, 2635], [1945, 2635], [1945, 2125]]);
					}
				}
			}
			color(c = [0.5000000000, 0.5000000000, 0.5000000000]) {
				translate(v = [0, 0, 2276.1000000000]) {
					linear_extrude(height = 340.0000000000) {
						polygon(paths = [[0, 1, 2, 3]], points = [[145, -85], [145, 85], [315, 85], [315, -85]]);
					}
				}
			}
			color(c = [0.5000000000, 0.5000000000, 0.5000000000]) {
				translate(v = [0, 0, 2276.1000000000]) {
					linear_extrude(height = 340.0000000000) {
						polygon(paths = [[0, 1, 2, 3]], points = [[605, -85], [605, 85], [775, 85], [775, -85]]);
					}
				}
			}
			color(c = [0.5000000000, 0.5000000000, 0.5000000000]) {
				translate(v = [0, 0, 2276.1000000000]) {
					linear_extrude(height = 340.0000000000) {
						polygon(paths = [[0, 1, 2, 3]], points = [[1065, -85], [1065, 85], [1235, 85], [1235, -85]]);
					}
				}
			}
			color(c = [0.5000000000, 0.5000000000, 0.5000000000]) {
				translate(v = [0, 0, 2276.1000000000]) {
					linear_extrude(height = 340.0000000000) {
						polygon(paths = [[0, 1, 2, 3]], points = [[1525, -85], [1525, 85], [1695, 85], [1695, -85]]);
					}
				}
			}
			color(c = [0.5000000000, 0.5000000000, 0.5000000000]) {
				translate(v = [0, 0, 2276.1000000000]) {
					linear_extrude(height = 340.0000000000) {
						polygon(paths = [[0, 1, 2, 3]], points = [[1985, -85], [1985, 85], [2155, 85], [2155, -85]]);
					}
				}
			}
			color(c = [0.5000000000, 0.5000000000, 0.5000000000]) {
				translate(v = [0, 0, 2276.1000000000]) {
					linear_extrude(height = 340.0000000000) {
						polygon(paths = [[0, 1, 2, 3]], points = [[2445, -85], [2445, 85], [2615, 85], [2615, -85]]);
					}
				}
			}
			color(c = [0.5000000000, 0.5000000000, 0.5000000000]) {
				translate(v = [0, 0, 2276.1000000000]) {
					linear_extrude(height = 340.0000000000) {
						polygon(paths = [[0, 1, 2, 3]], points = [[145, 2635], [145, 2805], [315, 2805], [315, 2635]]);
					}
				}
			}
			color(c = [0.5000000000, 0.5000000000, 0.5000000000]) {
				translate(v = [0, 0, 2276.1000000000]) {
					linear_extrude(height = 340.0000000000) {
						polygon(paths = [[0, 1, 2, 3]], points = [[605, 2635], [605, 2805], [775, 2805], [775, 2635]]);
					}
				}
			}
			color(c = [0.5000000000, 0.5000000000, 0.5000000000]) {
				translate(v = [0, 0, 2276.1000000000]) {
					linear_extrude(height = 340.0000000000) {
						polygon(paths = [[0, 1, 2, 3]], points = [[1065, 2635], [1065, 2805], [1235, 2805], [1235, 2635]]);
					}
				}
			}
			color(c = [0.5000000000, 0.5000000000, 0.5000000000]) {
				translate(v = [0, 0, 2276.1000000000]) {
					linear_extrude(height = 340.0000000000) {
						polygon(paths = [[0, 1, 2, 3]], points = [[1525, 2635], [1525, 2805], [1695, 2805], [1695, 2635]]);
					}
				}
			}
			color(c = [0.5000000000, 0.5000000000, 0.5000000000]) {
				translate(v = [0, 0, 2276.1000000000]) {
					linear_extrude(height = 340.0000000000) {
						polygon(paths = [[0, 1, 2, 3]], points = [[1985, 2635], [1985, 2805], [2155, 2805], [2155, 2635]]);
					}
				}
			}
			color(c = [0.5000000000, 0.5000000000, 0.5000000000]) {
				translate(v = [0, 0, 2276.1000000000]) {
					linear_extrude(height = 340.0000000000) {
						polygon(paths = [[0, 1, 2, 3]], points = [[2445, 2635], [2445, 2805], [2615, 2805], [2615, 2635]]);
					}
				}
			}
			color(c = [0.3000000000, 0.3000000000, 1]) {
				translate(v = [0, 0, 2616.1000000000]) {
					linear_extrude(height = 360.0000000000) {
						polygon(paths = [[0, 1, 2, 3]], points = [[0, -240], [0, 240], [2760, 240], [2760, -240]]);
					}
				}
			}
			color(c = [0.3000000000, 0.3000000000, 1]) {
				translate(v = [0, 0, 2616.1000000000]) {
					linear_extrude(height = 360.0000000000) {
						polygon(paths = [[0, 1, 2, 3]], points = [[0, 2480], [0, 2960], [2760, 2960], [2760, 2480]]);
					}
				}
			}
		}
	}
}
